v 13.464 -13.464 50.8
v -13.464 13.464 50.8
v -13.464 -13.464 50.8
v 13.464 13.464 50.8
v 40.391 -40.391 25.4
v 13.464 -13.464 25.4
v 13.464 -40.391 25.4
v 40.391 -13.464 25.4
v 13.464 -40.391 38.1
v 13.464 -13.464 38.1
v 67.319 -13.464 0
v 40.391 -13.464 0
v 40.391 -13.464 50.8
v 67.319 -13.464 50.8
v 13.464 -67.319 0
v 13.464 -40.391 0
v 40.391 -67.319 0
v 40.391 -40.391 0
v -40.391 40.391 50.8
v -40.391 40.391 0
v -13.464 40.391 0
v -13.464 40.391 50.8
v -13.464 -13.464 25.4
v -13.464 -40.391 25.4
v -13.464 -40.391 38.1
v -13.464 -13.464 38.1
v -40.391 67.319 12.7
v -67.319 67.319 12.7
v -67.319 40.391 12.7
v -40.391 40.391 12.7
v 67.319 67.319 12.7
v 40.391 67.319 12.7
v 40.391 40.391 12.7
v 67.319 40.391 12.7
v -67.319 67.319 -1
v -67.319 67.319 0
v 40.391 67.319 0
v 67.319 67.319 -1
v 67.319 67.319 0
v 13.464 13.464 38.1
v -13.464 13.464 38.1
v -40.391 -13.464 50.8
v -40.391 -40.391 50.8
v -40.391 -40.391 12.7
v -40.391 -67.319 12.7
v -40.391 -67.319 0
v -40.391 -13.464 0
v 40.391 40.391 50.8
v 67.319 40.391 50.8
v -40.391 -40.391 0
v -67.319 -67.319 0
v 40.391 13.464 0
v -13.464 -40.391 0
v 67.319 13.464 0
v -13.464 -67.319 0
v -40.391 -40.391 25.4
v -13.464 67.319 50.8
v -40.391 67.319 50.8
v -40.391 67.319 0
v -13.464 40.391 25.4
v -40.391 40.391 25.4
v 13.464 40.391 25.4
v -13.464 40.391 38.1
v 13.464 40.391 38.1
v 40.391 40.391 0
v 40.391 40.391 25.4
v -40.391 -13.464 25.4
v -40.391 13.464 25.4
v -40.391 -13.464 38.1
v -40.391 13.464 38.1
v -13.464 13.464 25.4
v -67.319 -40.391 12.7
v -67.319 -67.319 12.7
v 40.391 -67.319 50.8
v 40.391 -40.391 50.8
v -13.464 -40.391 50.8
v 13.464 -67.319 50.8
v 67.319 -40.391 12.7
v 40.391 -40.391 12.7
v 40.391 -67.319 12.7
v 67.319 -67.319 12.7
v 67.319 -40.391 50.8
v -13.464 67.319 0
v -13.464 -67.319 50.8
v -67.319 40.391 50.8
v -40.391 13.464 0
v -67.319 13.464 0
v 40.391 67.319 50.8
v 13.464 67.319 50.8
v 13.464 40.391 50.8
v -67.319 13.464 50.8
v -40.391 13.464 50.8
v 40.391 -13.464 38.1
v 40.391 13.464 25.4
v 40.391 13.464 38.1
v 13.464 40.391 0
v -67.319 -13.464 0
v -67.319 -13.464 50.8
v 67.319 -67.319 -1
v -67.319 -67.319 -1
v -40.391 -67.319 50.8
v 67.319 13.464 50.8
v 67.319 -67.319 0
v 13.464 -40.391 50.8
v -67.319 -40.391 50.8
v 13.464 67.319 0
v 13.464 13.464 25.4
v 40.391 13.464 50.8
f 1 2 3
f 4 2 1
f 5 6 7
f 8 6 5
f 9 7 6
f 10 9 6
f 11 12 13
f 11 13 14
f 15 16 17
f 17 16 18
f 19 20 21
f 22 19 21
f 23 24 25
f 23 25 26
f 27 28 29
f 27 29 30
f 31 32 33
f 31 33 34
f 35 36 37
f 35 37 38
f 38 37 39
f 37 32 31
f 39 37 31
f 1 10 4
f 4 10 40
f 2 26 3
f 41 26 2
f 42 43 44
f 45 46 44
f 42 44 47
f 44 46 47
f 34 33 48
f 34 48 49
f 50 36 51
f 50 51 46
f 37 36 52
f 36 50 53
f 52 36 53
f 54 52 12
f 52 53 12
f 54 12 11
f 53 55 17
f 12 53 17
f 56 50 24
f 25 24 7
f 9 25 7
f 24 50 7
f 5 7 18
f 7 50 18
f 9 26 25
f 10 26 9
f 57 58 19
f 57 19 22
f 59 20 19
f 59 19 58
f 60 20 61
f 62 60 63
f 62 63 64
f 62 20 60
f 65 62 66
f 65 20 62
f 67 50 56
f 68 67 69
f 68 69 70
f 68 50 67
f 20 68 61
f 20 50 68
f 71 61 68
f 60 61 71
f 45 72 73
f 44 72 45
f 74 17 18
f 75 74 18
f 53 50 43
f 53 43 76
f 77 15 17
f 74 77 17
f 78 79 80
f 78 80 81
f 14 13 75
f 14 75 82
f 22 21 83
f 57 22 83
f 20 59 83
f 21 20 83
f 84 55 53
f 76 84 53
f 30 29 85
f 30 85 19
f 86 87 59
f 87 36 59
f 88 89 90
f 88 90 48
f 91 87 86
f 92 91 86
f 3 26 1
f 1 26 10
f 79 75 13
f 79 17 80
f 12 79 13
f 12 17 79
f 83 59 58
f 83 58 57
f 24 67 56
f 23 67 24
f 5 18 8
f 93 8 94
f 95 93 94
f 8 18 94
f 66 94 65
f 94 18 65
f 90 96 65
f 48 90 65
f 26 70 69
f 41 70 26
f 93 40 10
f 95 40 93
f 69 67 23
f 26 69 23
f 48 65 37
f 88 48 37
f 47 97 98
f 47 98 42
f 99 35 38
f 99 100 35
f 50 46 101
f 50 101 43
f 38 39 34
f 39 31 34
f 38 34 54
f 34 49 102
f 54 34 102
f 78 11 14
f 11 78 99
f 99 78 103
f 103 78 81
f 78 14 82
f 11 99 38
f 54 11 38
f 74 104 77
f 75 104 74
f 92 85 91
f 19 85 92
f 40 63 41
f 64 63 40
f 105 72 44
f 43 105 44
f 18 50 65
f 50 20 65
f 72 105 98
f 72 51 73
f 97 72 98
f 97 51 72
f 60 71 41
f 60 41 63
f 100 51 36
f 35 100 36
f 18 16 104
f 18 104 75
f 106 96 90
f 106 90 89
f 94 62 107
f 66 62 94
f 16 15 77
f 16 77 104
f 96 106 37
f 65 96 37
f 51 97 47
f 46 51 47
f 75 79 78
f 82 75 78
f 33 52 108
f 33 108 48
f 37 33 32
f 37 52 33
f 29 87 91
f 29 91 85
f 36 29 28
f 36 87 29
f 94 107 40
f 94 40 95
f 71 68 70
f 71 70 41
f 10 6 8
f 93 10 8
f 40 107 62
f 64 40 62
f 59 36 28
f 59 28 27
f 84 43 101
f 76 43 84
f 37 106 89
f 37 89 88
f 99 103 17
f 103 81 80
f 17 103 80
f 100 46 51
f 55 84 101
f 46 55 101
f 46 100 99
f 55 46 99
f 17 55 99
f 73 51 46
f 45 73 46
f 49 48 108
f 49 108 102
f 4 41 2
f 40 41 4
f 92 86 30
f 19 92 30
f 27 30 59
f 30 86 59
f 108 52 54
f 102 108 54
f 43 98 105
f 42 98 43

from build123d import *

# Parameters (mm, degrees)
F0_W     = 26.9276529551
F0_H     = 26.9276529551
F1_DEPTH = 38.1
F2_DEPTH = 25.4
F3_DEPTH = 12.7
F4_DEPTH = 50.8
F8_DEPTH = 1


with BuildPart() as f1:
    # F0 (on Top) → F1 (new body)
    with BuildSketch(Plane.XY):
        with Locations((-26.9276529551, 0)):
            Rectangle(F0_W, F0_H)
    extrude(amount=F1_DEPTH)



with BuildPart() as f1b:
    # F0 (on Top) → F1, piece 2 (new body)
    with BuildSketch(Plane.XY):
        with Locations((0, 26.9276529551)):
            Rectangle(F0_W, F0_H)
    extrude(amount=F1_DEPTH)


with BuildPart() as f1c:
    # F0 (on Top) → F1, piece 3 (new body)
    with BuildSketch(Plane.XY):
        with Locations((26.9276529551, 0)):
            Rectangle(F0_W, F0_H)
    extrude(amount=F1_DEPTH)


with BuildPart() as f1d:
    # F0 (on Top) → F1, piece 4 (new body)
    with BuildSketch(Plane.XY):
        with Locations((0, -26.9276529551)):
            Rectangle(F0_W, F0_H)
    extrude(amount=F1_DEPTH)


with BuildPart() as f1_1:
    add(f1.part)

    add(f1b.part)  # F2 merges F1b

    add(f1c.part)  # F2 merges F1c

    add(f1d.part)  # F2 merges F1d
    # F0 (on Top) → F2 (join)
    with BuildSketch(Plane.XY):
        with Locations((-26.9276529551, -26.9276529551)):
            Rectangle(F0_W, F0_H)
        with Locations((-26.9276529551, 26.9276529551)):
            Rectangle(F0_W, F0_H)
        with Locations((26.9276529551, 26.9276529551)):
            Rectangle(F0_W, F0_H)
        with Locations((26.9276529551, -26.9276529551)):
            Rectangle(F0_W, F0_H)
    extrude(amount=F2_DEPTH)

    # F0 (on Top) → F4, piece 9 (join)
    with BuildSketch(Plane.XY):
        Rectangle(F0_W, F0_H)
    extrude(amount=F4_DEPTH)


with BuildPart() as f3:
    # F0 (on Top) → F3 (new body)
    with BuildSketch(Plane.XY):
        with Locations((-53.8553059101, 53.8553059101)):
            Rectangle(F0_W, F0_H)
    extrude(amount=F3_DEPTH)

    # F0 (on Top) → F4 (join)
    with BuildSketch(Plane.XY):
        with Locations((-53.8553059101, 26.9276529551)):
            Rectangle(F0_W, F0_H)
    extrude(amount=F4_DEPTH)


with BuildPart() as f3b:
    # F0 (on Top) → F3, piece 2 (new body)
    with BuildSketch(Plane.XY):
        with Locations((-53.8553059101, -53.8553059101)):
            Rectangle(F0_W, F0_H)
    extrude(amount=F3_DEPTH)

    # F0 (on Top) → F4, piece 8 (join)
    with BuildSketch(Plane.XY):
        with Locations((-53.8553059101, -26.9276529551)):
            Rectangle(F0_W, F0_H)
    extrude(amount=F4_DEPTH)

    # F5: union 


with BuildPart() as f3c:
    # F0 (on Top) → F3, piece 3 (new body)
    with BuildSketch(Plane.XY):
        with Locations((53.8553059101, 53.8553059101)):
            Rectangle(F0_W, F0_H)
    extrude(amount=F3_DEPTH)

    # F0 (on Top) → F4, piece 4 (join)
    with BuildSketch(Plane.XY):
        with Locations((53.8553059101, 26.9276529551)):
            Rectangle(F0_W, F0_H)
    extrude(amount=F4_DEPTH)

    # F6: union 



with BuildPart() as f3d:
    # F0 (on Top) → F3, piece 4 (new body)
    with BuildSketch(Plane.XY):
        with Locations((53.8553059101, -53.8553059101)):
            Rectangle(F0_W, F0_H)
    extrude(amount=F3_DEPTH)

    # F0 (on Top) → F4, piece 5 (join)
    with BuildSketch(Plane.XY):
        with Locations((53.8553059101, -26.9276529551)):
            Rectangle(F0_W, F0_H)
    extrude(amount=F4_DEPTH)


with BuildPart() as f4:
    # F0 (on Top) → F4, piece 2 (new body)
    with BuildSketch(Plane.XY):
        with Locations((-26.9276529551, 53.8553059101)):
            Rectangle(F0_W, F0_H)
    extrude(amount=F4_DEPTH)


with BuildPart() as f4b:
    # F0 (on Top) → F4, piece 3 (new body)
    with BuildSketch(Plane.XY):
        with Locations((26.9276529551, 53.8553059101)):
            Rectangle(F0_W, F0_H)
    extrude(amount=F4_DEPTH)


with BuildPart() as f4c:
    # F0 (on Top) → F4, piece 6 (new body)
    with BuildSketch(Plane.XY):
        with Locations((26.9276529551, -53.8553059101)):
            Rectangle(F0_W, F0_H)
    extrude(amount=F4_DEPTH)


with BuildPart() as f4d:
    # F0 (on Top) → F4, piece 7 (new body)
    with BuildSketch(Plane.XY):
        with Locations((-26.9276529551, -53.8553059101)):
            Rectangle(F0_W, F0_H)
    extrude(amount=F4_DEPTH)


with BuildPart() as f3c_1:
    add(f3c.part)

    add(f3d.part)  # F8 merges F3d

    add(f4d.part)  # F8 merges F4d
    # F7 (on face) → F8 (join)
    with BuildSketch(Plane(origin=(0, 0, 0), x_dir=(1, 0, 0), z_dir=(0, 0, -1))):
        Polygon((-67.3191323876, -67.3191323876), (67.3191323876, -67.3191323876), (67.3191323876, -13.4638264775), (67.3191323876, 67.3191323876), (-67.3191323876, 67.3191323876), (-67.3191323876, 13.4638264775), align=None)
    extrude(amount=F8_DEPTH)


solid = Compound([f1_1.part, f3.part, f3b.part, f4.part, f4b.part, f4c.part, f3c_1.part])
